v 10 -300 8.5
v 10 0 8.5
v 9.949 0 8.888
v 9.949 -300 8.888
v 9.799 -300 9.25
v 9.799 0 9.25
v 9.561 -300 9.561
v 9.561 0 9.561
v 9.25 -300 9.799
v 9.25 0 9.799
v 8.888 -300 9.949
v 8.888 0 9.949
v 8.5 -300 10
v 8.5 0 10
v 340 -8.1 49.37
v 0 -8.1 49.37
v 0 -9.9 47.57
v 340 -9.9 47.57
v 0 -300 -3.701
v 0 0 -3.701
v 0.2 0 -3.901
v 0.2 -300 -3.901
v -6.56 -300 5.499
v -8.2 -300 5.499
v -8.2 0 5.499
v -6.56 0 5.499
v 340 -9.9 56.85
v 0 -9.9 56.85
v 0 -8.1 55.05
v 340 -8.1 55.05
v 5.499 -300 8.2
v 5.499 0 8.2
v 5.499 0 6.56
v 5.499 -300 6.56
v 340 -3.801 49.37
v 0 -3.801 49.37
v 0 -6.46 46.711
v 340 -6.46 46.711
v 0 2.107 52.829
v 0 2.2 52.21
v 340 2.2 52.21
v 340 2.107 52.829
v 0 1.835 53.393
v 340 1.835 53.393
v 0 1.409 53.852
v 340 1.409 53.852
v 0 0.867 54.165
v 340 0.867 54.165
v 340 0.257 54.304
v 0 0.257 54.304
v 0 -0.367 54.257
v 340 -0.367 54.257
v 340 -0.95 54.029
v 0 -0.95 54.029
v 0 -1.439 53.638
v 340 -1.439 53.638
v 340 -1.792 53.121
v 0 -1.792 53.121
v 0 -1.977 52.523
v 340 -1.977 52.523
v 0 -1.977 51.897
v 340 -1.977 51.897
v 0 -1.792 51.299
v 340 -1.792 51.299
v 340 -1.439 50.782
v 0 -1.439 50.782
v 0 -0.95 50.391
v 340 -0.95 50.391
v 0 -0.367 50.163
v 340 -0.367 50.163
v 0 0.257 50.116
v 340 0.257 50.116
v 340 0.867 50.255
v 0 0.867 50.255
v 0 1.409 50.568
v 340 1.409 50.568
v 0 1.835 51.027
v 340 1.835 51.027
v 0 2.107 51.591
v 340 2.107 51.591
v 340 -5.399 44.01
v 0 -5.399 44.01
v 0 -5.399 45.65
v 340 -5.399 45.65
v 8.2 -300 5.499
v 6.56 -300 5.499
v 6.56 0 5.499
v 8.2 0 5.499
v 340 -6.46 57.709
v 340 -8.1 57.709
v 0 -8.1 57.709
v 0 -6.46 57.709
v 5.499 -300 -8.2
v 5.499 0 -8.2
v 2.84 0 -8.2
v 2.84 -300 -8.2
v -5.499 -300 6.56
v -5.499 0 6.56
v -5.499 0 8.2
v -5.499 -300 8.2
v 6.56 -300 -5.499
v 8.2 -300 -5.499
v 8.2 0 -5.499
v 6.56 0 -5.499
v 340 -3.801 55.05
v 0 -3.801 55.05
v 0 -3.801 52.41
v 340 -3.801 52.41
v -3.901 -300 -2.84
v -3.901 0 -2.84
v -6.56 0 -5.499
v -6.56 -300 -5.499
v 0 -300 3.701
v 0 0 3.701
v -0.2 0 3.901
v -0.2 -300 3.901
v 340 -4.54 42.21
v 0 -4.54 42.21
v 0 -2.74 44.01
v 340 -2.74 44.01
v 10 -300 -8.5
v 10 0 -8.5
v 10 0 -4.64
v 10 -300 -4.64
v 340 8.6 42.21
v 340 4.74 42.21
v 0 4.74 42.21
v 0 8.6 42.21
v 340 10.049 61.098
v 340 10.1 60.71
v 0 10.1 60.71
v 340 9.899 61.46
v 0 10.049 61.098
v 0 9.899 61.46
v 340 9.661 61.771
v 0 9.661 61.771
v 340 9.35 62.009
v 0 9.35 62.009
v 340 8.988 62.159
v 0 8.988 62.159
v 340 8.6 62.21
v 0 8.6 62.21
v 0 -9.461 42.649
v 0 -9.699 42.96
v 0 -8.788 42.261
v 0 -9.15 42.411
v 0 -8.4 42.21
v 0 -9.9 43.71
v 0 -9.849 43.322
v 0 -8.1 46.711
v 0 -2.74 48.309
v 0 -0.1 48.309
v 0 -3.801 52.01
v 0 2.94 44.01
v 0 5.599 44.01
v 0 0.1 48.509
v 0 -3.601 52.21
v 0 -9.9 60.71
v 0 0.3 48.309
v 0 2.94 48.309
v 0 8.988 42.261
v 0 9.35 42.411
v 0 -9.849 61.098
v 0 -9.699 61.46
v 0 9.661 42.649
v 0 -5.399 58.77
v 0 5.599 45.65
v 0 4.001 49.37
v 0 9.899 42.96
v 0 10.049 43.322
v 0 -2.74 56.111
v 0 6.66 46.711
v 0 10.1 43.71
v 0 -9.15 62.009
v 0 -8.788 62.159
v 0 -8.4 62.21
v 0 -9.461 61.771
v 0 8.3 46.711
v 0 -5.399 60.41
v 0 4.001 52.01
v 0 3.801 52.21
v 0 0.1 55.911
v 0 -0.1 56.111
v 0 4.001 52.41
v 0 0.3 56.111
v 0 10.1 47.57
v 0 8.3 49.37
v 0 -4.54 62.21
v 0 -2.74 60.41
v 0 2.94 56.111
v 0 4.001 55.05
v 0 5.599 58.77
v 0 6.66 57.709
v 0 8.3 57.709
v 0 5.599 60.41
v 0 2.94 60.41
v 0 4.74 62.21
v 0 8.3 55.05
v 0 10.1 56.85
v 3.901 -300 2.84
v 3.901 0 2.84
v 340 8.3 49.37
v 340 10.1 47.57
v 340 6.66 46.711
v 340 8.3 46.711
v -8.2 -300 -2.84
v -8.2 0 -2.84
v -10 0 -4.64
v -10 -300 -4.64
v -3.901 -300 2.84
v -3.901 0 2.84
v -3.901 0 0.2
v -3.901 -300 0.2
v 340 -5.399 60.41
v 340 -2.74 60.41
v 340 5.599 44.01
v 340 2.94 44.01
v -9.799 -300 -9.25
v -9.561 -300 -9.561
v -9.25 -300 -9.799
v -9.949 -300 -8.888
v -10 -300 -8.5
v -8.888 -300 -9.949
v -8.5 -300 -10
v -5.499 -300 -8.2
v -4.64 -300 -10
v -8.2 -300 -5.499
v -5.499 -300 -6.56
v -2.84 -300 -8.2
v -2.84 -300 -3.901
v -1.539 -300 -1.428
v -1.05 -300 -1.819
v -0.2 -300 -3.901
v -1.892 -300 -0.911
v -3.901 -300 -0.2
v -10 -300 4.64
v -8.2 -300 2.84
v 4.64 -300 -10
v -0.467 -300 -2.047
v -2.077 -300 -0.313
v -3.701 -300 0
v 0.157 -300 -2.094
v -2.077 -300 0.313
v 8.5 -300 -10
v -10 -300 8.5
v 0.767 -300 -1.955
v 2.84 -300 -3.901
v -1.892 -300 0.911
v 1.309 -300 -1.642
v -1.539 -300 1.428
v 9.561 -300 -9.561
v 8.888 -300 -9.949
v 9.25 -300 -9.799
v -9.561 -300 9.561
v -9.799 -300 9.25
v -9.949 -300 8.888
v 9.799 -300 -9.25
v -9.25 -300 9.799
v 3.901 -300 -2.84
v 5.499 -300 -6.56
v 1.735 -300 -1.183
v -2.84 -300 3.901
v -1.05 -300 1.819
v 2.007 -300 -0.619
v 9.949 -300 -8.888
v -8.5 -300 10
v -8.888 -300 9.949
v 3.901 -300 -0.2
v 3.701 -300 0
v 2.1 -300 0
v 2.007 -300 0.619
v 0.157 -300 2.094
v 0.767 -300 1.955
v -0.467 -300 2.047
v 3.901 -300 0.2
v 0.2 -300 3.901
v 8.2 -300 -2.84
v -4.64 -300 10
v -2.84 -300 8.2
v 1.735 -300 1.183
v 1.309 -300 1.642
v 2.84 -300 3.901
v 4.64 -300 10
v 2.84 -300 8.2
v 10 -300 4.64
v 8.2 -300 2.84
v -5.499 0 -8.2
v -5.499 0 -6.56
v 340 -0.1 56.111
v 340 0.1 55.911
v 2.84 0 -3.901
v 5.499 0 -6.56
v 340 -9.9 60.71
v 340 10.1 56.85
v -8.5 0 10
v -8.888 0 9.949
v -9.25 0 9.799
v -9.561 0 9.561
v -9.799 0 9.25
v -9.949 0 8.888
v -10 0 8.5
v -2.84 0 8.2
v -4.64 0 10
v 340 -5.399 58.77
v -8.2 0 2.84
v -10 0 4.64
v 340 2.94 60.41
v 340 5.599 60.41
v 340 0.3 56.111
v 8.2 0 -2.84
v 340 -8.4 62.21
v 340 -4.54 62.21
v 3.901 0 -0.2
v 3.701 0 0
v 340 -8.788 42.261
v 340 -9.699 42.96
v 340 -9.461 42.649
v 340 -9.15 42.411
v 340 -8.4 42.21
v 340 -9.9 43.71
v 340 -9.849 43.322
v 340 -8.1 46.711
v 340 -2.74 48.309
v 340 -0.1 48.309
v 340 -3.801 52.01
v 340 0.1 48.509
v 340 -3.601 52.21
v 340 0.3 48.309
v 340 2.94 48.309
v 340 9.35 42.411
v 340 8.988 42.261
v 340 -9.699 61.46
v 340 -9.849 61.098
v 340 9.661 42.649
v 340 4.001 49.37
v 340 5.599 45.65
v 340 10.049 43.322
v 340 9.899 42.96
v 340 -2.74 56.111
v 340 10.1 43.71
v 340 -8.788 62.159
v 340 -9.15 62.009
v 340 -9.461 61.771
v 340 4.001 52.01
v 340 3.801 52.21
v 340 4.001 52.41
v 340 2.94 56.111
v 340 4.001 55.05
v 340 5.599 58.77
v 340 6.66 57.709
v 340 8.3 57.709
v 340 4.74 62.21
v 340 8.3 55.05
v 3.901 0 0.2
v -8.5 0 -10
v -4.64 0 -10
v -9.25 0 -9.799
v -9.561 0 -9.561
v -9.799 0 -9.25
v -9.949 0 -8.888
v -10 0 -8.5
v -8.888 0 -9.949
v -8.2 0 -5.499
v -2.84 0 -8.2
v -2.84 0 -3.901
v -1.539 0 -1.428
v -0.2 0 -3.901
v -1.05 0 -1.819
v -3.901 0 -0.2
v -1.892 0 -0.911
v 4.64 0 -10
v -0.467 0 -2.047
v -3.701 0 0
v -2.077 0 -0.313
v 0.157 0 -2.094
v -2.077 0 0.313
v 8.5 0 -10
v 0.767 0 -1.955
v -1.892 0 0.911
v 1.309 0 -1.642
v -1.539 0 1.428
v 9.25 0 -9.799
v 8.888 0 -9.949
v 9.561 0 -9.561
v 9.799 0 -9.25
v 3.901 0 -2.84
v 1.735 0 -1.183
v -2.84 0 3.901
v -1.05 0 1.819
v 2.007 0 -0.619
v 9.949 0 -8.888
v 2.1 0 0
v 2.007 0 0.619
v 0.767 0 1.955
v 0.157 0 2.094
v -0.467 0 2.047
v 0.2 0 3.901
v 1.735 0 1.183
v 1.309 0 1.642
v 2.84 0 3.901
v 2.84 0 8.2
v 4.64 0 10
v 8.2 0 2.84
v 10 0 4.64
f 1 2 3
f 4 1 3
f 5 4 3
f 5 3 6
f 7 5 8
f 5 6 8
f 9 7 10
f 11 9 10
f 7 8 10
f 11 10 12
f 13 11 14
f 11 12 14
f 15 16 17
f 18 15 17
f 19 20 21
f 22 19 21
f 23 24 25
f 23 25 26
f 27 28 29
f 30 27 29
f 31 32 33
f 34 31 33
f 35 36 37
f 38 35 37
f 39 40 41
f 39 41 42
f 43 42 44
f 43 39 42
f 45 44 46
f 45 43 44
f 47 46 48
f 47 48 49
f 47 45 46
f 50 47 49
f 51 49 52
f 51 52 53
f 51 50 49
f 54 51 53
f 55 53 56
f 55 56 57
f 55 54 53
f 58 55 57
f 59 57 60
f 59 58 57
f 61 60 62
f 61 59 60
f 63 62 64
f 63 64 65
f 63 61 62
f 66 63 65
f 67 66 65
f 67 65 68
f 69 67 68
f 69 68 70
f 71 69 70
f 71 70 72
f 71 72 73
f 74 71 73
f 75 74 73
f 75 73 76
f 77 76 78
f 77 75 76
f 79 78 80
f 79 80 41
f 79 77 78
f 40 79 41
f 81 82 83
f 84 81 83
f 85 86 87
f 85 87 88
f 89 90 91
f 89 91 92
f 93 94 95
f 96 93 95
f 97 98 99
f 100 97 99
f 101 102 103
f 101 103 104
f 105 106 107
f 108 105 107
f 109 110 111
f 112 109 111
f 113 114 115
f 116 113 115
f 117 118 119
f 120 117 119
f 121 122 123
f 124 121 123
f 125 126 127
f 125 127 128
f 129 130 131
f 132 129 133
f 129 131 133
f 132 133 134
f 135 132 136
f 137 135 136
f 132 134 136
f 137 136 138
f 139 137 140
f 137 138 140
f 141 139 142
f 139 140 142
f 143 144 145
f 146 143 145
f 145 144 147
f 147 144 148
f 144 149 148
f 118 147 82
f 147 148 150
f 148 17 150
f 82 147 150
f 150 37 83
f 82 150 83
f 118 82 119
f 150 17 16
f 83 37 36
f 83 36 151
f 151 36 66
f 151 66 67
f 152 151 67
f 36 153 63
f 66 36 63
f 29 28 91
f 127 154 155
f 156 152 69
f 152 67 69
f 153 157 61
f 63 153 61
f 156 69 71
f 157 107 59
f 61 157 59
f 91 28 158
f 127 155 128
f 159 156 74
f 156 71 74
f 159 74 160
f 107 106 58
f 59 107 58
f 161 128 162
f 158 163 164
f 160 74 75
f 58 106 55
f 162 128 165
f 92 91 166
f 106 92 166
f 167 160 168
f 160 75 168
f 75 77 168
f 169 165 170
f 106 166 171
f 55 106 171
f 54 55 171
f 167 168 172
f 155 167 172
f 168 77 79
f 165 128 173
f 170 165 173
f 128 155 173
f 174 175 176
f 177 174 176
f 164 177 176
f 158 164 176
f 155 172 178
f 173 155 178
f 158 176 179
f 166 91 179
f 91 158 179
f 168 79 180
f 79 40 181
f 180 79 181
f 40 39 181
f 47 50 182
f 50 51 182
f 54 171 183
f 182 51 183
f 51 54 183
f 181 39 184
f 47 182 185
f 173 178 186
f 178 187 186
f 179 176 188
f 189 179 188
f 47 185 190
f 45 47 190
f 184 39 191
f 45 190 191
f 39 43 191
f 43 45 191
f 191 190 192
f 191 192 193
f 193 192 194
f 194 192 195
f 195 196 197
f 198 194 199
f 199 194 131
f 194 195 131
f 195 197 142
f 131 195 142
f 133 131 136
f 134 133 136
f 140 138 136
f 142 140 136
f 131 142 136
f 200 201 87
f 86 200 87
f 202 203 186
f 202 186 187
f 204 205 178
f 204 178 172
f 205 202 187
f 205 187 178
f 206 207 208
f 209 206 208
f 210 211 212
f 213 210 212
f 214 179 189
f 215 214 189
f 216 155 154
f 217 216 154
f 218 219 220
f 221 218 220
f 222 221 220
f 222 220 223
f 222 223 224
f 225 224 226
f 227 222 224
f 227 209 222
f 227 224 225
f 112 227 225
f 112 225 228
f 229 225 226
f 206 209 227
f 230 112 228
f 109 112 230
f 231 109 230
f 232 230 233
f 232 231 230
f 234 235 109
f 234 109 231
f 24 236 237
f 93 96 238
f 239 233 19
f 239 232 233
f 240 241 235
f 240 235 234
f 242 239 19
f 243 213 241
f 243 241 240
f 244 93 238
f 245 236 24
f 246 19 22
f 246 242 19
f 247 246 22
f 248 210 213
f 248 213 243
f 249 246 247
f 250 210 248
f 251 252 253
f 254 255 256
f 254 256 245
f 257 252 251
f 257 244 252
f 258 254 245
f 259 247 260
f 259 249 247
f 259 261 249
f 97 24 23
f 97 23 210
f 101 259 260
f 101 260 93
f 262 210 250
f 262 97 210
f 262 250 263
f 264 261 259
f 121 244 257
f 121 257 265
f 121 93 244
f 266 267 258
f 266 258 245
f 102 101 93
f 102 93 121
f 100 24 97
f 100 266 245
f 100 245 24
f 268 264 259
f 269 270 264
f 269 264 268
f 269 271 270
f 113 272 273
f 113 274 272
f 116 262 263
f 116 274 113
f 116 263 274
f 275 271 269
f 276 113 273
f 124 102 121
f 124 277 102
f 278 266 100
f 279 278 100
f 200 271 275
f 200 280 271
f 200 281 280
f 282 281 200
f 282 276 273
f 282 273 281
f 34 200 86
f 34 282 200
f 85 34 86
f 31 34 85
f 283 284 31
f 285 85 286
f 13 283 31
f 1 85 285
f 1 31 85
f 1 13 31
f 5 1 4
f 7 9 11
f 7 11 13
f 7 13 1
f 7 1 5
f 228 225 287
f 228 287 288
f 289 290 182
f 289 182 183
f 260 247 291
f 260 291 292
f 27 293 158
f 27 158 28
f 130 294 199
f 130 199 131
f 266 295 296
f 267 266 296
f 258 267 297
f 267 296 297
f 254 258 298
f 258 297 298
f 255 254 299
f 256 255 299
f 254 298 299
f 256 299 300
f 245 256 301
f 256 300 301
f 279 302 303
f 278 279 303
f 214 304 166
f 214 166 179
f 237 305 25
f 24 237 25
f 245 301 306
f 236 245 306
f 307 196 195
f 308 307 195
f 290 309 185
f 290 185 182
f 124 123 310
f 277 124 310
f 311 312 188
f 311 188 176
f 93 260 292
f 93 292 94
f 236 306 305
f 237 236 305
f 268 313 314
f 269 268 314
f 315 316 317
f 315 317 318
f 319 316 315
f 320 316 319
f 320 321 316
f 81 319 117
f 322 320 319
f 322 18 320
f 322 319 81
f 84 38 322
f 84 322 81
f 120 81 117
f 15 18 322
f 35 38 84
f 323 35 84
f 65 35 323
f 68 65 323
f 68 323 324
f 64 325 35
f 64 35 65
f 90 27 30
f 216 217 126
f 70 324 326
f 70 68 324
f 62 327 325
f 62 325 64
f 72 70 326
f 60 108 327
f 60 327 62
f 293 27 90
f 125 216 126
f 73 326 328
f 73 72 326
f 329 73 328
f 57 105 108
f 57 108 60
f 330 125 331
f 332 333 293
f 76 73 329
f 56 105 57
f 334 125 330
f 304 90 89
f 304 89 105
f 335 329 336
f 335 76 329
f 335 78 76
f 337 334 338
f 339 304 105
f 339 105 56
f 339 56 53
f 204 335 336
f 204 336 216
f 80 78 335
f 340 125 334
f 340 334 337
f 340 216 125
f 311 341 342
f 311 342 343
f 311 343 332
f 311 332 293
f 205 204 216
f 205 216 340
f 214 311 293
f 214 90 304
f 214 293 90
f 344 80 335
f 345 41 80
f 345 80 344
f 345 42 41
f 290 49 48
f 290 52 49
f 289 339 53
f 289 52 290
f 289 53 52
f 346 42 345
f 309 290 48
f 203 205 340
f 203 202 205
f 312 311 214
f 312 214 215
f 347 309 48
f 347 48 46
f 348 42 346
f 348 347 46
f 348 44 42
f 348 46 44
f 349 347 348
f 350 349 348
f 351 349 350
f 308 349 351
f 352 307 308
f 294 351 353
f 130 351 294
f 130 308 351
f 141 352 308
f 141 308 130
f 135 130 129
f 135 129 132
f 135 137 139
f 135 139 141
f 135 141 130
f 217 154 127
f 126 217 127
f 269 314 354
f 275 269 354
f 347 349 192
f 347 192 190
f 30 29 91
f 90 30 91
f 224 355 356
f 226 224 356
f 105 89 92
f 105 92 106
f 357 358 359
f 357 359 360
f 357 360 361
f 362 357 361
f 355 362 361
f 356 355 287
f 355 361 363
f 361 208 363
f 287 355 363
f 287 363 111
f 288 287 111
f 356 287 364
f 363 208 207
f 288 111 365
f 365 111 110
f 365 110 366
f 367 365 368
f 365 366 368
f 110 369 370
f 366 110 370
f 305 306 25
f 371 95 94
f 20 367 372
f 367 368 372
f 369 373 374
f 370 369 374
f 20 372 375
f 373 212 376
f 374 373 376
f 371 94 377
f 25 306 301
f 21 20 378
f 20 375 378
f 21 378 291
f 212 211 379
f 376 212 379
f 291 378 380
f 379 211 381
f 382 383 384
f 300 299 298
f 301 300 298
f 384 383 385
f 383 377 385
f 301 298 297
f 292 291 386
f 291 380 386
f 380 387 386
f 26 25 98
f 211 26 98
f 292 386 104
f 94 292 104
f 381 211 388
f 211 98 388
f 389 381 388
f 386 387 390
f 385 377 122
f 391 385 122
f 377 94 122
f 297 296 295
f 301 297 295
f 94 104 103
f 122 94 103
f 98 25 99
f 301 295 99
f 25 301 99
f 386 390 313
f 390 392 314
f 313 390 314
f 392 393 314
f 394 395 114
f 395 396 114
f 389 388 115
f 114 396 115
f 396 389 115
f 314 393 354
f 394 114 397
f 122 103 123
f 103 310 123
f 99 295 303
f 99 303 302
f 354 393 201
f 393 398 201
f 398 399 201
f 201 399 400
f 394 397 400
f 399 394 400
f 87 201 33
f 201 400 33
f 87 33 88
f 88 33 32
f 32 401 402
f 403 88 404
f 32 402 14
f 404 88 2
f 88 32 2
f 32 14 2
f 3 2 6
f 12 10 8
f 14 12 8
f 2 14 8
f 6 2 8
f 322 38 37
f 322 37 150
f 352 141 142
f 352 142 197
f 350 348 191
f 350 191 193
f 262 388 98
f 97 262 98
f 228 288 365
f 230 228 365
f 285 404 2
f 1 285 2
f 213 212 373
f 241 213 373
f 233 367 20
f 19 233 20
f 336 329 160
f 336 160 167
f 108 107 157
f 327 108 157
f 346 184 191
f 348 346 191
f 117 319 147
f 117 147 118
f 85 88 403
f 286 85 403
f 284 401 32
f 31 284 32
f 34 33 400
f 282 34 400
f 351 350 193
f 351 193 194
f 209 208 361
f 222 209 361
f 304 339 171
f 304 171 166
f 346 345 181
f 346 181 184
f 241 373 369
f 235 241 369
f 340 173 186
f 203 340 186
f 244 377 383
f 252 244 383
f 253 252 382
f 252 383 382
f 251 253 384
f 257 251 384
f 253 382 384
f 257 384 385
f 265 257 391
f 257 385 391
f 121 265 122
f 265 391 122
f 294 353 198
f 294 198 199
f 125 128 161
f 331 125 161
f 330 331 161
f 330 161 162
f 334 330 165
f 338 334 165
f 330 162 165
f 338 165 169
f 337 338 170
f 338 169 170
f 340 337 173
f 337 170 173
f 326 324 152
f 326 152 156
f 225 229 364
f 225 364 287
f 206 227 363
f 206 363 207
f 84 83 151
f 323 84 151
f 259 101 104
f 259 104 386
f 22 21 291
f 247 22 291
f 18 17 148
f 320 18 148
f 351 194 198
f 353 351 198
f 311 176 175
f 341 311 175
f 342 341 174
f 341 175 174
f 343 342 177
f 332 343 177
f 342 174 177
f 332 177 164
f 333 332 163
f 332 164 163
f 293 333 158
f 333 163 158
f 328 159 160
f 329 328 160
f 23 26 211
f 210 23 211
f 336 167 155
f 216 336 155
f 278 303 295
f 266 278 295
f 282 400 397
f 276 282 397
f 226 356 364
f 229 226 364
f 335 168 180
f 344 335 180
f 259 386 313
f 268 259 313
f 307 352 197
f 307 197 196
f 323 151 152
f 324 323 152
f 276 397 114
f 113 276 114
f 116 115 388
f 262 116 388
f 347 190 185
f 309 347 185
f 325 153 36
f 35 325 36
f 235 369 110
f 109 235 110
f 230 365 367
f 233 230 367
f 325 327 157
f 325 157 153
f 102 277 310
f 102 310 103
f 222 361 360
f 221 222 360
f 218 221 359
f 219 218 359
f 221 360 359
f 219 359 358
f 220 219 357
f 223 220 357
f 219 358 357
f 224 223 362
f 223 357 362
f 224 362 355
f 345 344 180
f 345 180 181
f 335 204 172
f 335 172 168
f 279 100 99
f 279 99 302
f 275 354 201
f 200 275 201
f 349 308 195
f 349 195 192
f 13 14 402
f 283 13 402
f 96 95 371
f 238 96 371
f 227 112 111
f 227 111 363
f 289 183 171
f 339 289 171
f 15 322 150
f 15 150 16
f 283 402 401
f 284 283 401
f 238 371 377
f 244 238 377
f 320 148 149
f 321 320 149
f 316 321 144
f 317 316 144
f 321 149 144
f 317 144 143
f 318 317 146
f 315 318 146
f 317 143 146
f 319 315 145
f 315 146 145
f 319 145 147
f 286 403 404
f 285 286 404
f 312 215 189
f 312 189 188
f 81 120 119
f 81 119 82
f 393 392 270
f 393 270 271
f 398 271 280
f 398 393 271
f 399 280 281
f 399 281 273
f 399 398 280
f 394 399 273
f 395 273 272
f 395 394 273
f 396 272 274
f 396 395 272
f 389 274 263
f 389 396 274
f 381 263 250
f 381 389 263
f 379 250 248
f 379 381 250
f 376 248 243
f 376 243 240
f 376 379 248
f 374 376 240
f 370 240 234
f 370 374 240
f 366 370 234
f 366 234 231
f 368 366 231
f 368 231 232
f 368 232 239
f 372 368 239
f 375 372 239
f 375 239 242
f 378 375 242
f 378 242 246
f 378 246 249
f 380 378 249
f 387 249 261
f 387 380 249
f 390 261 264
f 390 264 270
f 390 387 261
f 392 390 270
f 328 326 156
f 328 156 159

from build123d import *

# Parameters (mm, degrees)
F0_R     = 2.1
F2_DEPTH = 300
F1_R     = 2.1
F3_DEPTH = 340


# Not quite as in the source:
# - ends of sketch curves that miss each other by under 0.0002 mm in the source are joined


with BuildPart() as f2:
    # F0 (on Front) → F2 (new body)
    with BuildSketch(Plane.XZ):
        with BuildLine():
            Line((-4.6400004426, 10.0000019805), (-8.5000014426, 10.0000019805))
            ThreePointArc((-8.5000014426, 10.0000019805), (-9.560661968, 9.5606617987), (-10.0000014426, 8.5000009805))
            Line((-10.0000014426, 8.5000009805), (-10.0000014426, 4.6400009805))
            Line((-10.0000014426, 4.6400009805), (-8.1999994426, 2.8400009805))
            Line((-8.1999994426, 2.8400009805), (-8.1999994426, 5.4993389805))
            Line((-8.1999994426, 5.4993389805), (-6.5600004426, 5.4993389805))
            Line((-6.5600004426, 5.4993389805), (-3.9006604426, 2.8400009805))
            Line((-3.9006604426, 2.8400009805), (-3.9006604426, 0.1999999805))
            Line((-3.9006604426, 0.1999999805), (-3.7006604426, -1.95e-08))
            Line((-3.7006604426, -1.95e-08), (-3.9006604426, -0.2000000195))
            Line((-3.9006604426, -0.2000000195), (-3.9006604426, -2.8400010195))
            Line((-3.9006604426, -2.8400010195), (-6.5600004426, -5.4993410195))
            Line((-6.5600004426, -5.4993410195), (-8.1999994426, -5.4993410195))
            Line((-8.1999994426, -5.4993410195), (-8.1999994426, -2.8400010195))
            Line((-8.1999994426, -2.8400010195), (-10.0000014426, -4.6400010195))
            Line((-10.0000014426, -4.6400010195), (-10.0000014426, -8.5000010195))
            ThreePointArc((-10.0000014426, -8.5000010195), (-9.5606612608, -9.5606615448), (-8.5000014426, -10.0000010195))
            Line((-8.5000014426, -10.0000010195), (-4.6400004426, -10.0000010195))
            Line((-4.6400004426, -10.0000010195), (-2.8400004426, -8.2000000195))
            Line((-2.8400004426, -8.2000000195), (-5.4993404426, -8.2000000195))
            Line((-5.4993404426, -8.2000000195), (-5.4993404426, -6.5600010195))
            Line((-5.4993404426, -6.5600010195), (-2.8400004426, -3.9006610195))
            Line((-2.8400004426, -3.9006610195), (-0.1999994426, -3.9006610195))
            Line((-0.1999994426, -3.9006610195), (5.574e-07, -3.7006610195))
            Line((5.574e-07, -3.7006610195), (0.2000005574, -3.9006610195))
            Line((0.2000005574, -3.9006610195), (2.8399995574, -3.9006610195))
            Line((2.8399995574, -3.9006610195), (5.4993415574, -6.5600010195))
            Line((5.4993415574, -6.5600010195), (5.4993415574, -8.2000000195))
            Line((5.4993415574, -8.2000000195), (2.8399995574, -8.2000000195))
            Line((2.8399995574, -8.2000000195), (4.6399995574, -10.0000010195))
            Line((4.6399995574, -10.0000010195), (8.5000005574, -10.0000010195))
            ThreePointArc((8.5000005574, -10.0000010195), (9.5606607292, -9.5606611913), (10.0000005574, -8.5000010195))
            Line((10.0000005574, -8.5000010195), (10.0000005574, -4.6400010195))
            Line((10.0000005574, -4.6400010195), (8.2000005574, -2.8400010195))
            Line((8.2000005574, -2.8400010195), (8.2000005574, -5.4993410195))
            Line((8.2000005574, -5.4993410195), (6.5600015574, -5.4993410195))
            Line((6.5600015574, -5.4993410195), (3.9006595574, -2.8400010195))
            Line((3.9006595574, -2.8400010195), (3.9006595574, -0.2000000195))
            Line((3.9006595574, -0.2000000195), (3.7006595574, -1.95e-08))
            Line((3.7006595574, -1.95e-08), (3.9006595574, 0.1999999805))
            Line((3.9006595574, 0.1999999805), (3.9006595574, 2.8400009805))
            Line((3.9006595574, 2.8400009805), (6.5600015574, 5.4993389805))
            Line((6.5600015574, 5.4993389805), (8.2000005574, 5.4993389805))
            Line((8.2000005574, 5.4993389805), (8.2000005574, 2.8400009805))
            Line((8.2000005574, 2.8400009805), (10.0000005574, 4.6400009805))
            Line((10.0000005574, 4.6400009805), (10.0000005574, 8.5000019805))
            ThreePointArc((10.0000005574, 8.5000019805), (9.5606607292, 9.5606621523), (8.5000005574, 10.0000019805))
            Line((8.5000005574, 10.0000019805), (4.6399995574, 10.0000019805))
            Line((4.6399995574, 10.0000019805), (2.8399995574, 8.2000019805))
            Line((2.8399995574, 8.2000019805), (5.4993415574, 8.2000019805))
            Line((5.4993415574, 8.2000019805), (5.4993415574, 6.5599989805))
            Line((5.4993415574, 6.5599989805), (2.8399995574, 3.9006609805))
            Line((2.8399995574, 3.9006609805), (0.2000005574, 3.9006609805))
            Line((0.2000005574, 3.9006609805), (5.574e-07, 3.7006609805))
            Line((5.574e-07, 3.7006609805), (-0.1999994426, 3.9006609805))
            Line((-0.1999994426, 3.9006609805), (-2.8400004426, 3.9006609805))
            Line((-2.8400004426, 3.9006609805), (-5.4993404426, 6.5599989805))
            Line((-5.4993404426, 6.5599989805), (-5.4993404426, 8.2000019805))
            Line((-5.4993404426, 8.2000019805), (-2.8400004426, 8.2000019805))
            Line((-2.8400004426, 8.2000019805), (-4.6400004426, 10.0000019805))
        make_face()
        with Locations((5.574e-07, -1.95e-08)):
            Circle(F0_R, mode=Mode.SUBTRACT)
    extrude(amount=F2_DEPTH)


with BuildPart() as f3:
    # F1 (on Right) → F3 (new body)
    with BuildSketch(Plane.YZ):
        with BuildLine():
            Line((-4.5399968378, 62.209959795), (-8.3999978378, 62.209959795))
            ThreePointArc((-8.3999978378, 62.209959795), (-9.4606583632, 61.7706196132), (-9.8999978378, 60.709958795))
            Line((-9.8999978378, 60.709958795), (-9.8999978378, 56.849958795))
            Line((-9.8999978378, 56.849958795), (-8.0999958378, 55.049958795))
            Line((-8.0999958378, 55.049958795), (-8.0999958378, 57.709296795))
            Line((-8.0999958378, 57.709296795), (-6.4599968378, 57.709296795))
            Line((-6.4599968378, 57.709296795), (-3.8006568378, 55.049958795))
            Line((-3.8006568378, 55.049958795), (-3.8006568378, 52.409957795))
            Line((-3.8006568378, 52.409957795), (-3.6006568378, 52.209957795))
            Line((-3.6006568378, 52.209957795), (-3.8006568378, 52.009957795))
            Line((-3.8006568378, 52.009957795), (-3.8006568378, 49.369956795))
            Line((-3.8006568378, 49.369956795), (-6.4599968378, 46.710616795))
            Line((-6.4599968378, 46.710616795), (-8.0999958378, 46.710616795))
            Line((-8.0999958378, 46.710616795), (-8.0999958378, 49.369956795))
            Line((-8.0999958378, 49.369956795), (-9.8999978378, 47.569956795))
            Line((-9.8999978378, 47.569956795), (-9.8999978378, 43.709956795))
            ThreePointArc((-9.8999978378, 43.709956795), (-9.4606576561, 42.6492962696), (-8.3999978378, 42.209956795))
            Line((-8.3999978378, 42.209956795), (-4.5399968378, 42.209956795))
            Line((-4.5399968378, 42.209956795), (-2.7399968378, 44.009957795))
            Line((-2.7399968378, 44.009957795), (-5.3993368378, 44.009957795))
            Line((-5.3993368378, 44.009957795), (-5.3993368378, 45.649956795))
            Line((-5.3993368378, 45.649956795), (-2.7399968378, 48.309296795))
            Line((-2.7399968378, 48.309296795), (-0.0999958378, 48.309296795))
            Line((-0.0999958378, 48.309296795), (0.1000041622, 48.509296795))
            Line((0.1000041622, 48.509296795), (0.3000041622, 48.309296795))
            Line((0.3000041622, 48.309296795), (2.9400031622, 48.309296795))
            Line((2.9400031622, 48.309296795), (5.5993451622, 45.649956795))
            Line((5.5993451622, 45.649956795), (5.5993451622, 44.009957795))
            Line((5.5993451622, 44.009957795), (2.9400031622, 44.009957795))
            Line((2.9400031622, 44.009957795), (4.7400031622, 42.209956795))
            Line((4.7400031622, 42.209956795), (8.6000041622, 42.209956795))
            ThreePointArc((8.6000041622, 42.209956795), (9.6606643339, 42.6492966232), (10.1000041622, 43.709956795))
            Line((10.1000041622, 43.709956795), (10.1000041622, 47.569956795))
            Line((10.1000041622, 47.569956795), (8.3000041622, 49.369956795))
            Line((8.3000041622, 49.369956795), (8.3000041622, 46.710616795))
            Line((8.3000041622, 46.710616795), (6.6600051622, 46.710616795))
            Line((6.6600051622, 46.710616795), (4.0006631622, 49.369956795))
            Line((4.0006631622, 49.369956795), (4.0006631622, 52.009957795))
            Line((4.0006631622, 52.009957795), (3.8006631622, 52.209957795))
            Line((3.8006631622, 52.209957795), (4.0006631622, 52.409957795))
            Line((4.0006631622, 52.409957795), (4.0006631622, 55.049958795))
            Line((4.0006631622, 55.049958795), (6.6600051622, 57.709296795))
            Line((6.6600051622, 57.709296795), (8.3000041622, 57.709296795))
            Line((8.3000041622, 57.709296795), (8.3000041622, 55.049958795))
            Line((8.3000041622, 55.049958795), (10.1000041622, 56.849958795))
            Line((10.1000041622, 56.849958795), (10.1000041622, 60.709959795))
            ThreePointArc((10.1000041622, 60.709959795), (9.6606643339, 61.7706199668), (8.6000041622, 62.209959795))
            Line((8.6000041622, 62.209959795), (4.7400031622, 62.209959795))
            Line((4.7400031622, 62.209959795), (2.9400031622, 60.409959795))
            Line((2.9400031622, 60.409959795), (5.5993451622, 60.409959795))
            Line((5.5993451622, 60.409959795), (5.5993451622, 58.769956795))
            Line((5.5993451622, 58.769956795), (2.9400031622, 56.110618795))
            Line((2.9400031622, 56.110618795), (0.3000041622, 56.110618795))
            Line((0.3000041622, 56.110618795), (0.1000041622, 55.910618795))
            Line((0.1000041622, 55.910618795), (-0.0999958378, 56.110618795))
            Line((-0.0999958378, 56.110618795), (-2.7399968378, 56.110618795))
            Line((-2.7399968378, 56.110618795), (-5.3993368378, 58.769956795))
            Line((-5.3993368378, 58.769956795), (-5.3993368378, 60.409959795))
            Line((-5.3993368378, 60.409959795), (-2.7399968378, 60.409959795))
            Line((-2.7399968378, 60.409959795), (-4.5399968378, 62.209959795))
        make_face()
        with Locations((0.1000041622, 52.209957795)):
            Circle(F1_R, mode=Mode.SUBTRACT)
    extrude(amount=F3_DEPTH)


solid = Compound([f2.part, f3.part])
